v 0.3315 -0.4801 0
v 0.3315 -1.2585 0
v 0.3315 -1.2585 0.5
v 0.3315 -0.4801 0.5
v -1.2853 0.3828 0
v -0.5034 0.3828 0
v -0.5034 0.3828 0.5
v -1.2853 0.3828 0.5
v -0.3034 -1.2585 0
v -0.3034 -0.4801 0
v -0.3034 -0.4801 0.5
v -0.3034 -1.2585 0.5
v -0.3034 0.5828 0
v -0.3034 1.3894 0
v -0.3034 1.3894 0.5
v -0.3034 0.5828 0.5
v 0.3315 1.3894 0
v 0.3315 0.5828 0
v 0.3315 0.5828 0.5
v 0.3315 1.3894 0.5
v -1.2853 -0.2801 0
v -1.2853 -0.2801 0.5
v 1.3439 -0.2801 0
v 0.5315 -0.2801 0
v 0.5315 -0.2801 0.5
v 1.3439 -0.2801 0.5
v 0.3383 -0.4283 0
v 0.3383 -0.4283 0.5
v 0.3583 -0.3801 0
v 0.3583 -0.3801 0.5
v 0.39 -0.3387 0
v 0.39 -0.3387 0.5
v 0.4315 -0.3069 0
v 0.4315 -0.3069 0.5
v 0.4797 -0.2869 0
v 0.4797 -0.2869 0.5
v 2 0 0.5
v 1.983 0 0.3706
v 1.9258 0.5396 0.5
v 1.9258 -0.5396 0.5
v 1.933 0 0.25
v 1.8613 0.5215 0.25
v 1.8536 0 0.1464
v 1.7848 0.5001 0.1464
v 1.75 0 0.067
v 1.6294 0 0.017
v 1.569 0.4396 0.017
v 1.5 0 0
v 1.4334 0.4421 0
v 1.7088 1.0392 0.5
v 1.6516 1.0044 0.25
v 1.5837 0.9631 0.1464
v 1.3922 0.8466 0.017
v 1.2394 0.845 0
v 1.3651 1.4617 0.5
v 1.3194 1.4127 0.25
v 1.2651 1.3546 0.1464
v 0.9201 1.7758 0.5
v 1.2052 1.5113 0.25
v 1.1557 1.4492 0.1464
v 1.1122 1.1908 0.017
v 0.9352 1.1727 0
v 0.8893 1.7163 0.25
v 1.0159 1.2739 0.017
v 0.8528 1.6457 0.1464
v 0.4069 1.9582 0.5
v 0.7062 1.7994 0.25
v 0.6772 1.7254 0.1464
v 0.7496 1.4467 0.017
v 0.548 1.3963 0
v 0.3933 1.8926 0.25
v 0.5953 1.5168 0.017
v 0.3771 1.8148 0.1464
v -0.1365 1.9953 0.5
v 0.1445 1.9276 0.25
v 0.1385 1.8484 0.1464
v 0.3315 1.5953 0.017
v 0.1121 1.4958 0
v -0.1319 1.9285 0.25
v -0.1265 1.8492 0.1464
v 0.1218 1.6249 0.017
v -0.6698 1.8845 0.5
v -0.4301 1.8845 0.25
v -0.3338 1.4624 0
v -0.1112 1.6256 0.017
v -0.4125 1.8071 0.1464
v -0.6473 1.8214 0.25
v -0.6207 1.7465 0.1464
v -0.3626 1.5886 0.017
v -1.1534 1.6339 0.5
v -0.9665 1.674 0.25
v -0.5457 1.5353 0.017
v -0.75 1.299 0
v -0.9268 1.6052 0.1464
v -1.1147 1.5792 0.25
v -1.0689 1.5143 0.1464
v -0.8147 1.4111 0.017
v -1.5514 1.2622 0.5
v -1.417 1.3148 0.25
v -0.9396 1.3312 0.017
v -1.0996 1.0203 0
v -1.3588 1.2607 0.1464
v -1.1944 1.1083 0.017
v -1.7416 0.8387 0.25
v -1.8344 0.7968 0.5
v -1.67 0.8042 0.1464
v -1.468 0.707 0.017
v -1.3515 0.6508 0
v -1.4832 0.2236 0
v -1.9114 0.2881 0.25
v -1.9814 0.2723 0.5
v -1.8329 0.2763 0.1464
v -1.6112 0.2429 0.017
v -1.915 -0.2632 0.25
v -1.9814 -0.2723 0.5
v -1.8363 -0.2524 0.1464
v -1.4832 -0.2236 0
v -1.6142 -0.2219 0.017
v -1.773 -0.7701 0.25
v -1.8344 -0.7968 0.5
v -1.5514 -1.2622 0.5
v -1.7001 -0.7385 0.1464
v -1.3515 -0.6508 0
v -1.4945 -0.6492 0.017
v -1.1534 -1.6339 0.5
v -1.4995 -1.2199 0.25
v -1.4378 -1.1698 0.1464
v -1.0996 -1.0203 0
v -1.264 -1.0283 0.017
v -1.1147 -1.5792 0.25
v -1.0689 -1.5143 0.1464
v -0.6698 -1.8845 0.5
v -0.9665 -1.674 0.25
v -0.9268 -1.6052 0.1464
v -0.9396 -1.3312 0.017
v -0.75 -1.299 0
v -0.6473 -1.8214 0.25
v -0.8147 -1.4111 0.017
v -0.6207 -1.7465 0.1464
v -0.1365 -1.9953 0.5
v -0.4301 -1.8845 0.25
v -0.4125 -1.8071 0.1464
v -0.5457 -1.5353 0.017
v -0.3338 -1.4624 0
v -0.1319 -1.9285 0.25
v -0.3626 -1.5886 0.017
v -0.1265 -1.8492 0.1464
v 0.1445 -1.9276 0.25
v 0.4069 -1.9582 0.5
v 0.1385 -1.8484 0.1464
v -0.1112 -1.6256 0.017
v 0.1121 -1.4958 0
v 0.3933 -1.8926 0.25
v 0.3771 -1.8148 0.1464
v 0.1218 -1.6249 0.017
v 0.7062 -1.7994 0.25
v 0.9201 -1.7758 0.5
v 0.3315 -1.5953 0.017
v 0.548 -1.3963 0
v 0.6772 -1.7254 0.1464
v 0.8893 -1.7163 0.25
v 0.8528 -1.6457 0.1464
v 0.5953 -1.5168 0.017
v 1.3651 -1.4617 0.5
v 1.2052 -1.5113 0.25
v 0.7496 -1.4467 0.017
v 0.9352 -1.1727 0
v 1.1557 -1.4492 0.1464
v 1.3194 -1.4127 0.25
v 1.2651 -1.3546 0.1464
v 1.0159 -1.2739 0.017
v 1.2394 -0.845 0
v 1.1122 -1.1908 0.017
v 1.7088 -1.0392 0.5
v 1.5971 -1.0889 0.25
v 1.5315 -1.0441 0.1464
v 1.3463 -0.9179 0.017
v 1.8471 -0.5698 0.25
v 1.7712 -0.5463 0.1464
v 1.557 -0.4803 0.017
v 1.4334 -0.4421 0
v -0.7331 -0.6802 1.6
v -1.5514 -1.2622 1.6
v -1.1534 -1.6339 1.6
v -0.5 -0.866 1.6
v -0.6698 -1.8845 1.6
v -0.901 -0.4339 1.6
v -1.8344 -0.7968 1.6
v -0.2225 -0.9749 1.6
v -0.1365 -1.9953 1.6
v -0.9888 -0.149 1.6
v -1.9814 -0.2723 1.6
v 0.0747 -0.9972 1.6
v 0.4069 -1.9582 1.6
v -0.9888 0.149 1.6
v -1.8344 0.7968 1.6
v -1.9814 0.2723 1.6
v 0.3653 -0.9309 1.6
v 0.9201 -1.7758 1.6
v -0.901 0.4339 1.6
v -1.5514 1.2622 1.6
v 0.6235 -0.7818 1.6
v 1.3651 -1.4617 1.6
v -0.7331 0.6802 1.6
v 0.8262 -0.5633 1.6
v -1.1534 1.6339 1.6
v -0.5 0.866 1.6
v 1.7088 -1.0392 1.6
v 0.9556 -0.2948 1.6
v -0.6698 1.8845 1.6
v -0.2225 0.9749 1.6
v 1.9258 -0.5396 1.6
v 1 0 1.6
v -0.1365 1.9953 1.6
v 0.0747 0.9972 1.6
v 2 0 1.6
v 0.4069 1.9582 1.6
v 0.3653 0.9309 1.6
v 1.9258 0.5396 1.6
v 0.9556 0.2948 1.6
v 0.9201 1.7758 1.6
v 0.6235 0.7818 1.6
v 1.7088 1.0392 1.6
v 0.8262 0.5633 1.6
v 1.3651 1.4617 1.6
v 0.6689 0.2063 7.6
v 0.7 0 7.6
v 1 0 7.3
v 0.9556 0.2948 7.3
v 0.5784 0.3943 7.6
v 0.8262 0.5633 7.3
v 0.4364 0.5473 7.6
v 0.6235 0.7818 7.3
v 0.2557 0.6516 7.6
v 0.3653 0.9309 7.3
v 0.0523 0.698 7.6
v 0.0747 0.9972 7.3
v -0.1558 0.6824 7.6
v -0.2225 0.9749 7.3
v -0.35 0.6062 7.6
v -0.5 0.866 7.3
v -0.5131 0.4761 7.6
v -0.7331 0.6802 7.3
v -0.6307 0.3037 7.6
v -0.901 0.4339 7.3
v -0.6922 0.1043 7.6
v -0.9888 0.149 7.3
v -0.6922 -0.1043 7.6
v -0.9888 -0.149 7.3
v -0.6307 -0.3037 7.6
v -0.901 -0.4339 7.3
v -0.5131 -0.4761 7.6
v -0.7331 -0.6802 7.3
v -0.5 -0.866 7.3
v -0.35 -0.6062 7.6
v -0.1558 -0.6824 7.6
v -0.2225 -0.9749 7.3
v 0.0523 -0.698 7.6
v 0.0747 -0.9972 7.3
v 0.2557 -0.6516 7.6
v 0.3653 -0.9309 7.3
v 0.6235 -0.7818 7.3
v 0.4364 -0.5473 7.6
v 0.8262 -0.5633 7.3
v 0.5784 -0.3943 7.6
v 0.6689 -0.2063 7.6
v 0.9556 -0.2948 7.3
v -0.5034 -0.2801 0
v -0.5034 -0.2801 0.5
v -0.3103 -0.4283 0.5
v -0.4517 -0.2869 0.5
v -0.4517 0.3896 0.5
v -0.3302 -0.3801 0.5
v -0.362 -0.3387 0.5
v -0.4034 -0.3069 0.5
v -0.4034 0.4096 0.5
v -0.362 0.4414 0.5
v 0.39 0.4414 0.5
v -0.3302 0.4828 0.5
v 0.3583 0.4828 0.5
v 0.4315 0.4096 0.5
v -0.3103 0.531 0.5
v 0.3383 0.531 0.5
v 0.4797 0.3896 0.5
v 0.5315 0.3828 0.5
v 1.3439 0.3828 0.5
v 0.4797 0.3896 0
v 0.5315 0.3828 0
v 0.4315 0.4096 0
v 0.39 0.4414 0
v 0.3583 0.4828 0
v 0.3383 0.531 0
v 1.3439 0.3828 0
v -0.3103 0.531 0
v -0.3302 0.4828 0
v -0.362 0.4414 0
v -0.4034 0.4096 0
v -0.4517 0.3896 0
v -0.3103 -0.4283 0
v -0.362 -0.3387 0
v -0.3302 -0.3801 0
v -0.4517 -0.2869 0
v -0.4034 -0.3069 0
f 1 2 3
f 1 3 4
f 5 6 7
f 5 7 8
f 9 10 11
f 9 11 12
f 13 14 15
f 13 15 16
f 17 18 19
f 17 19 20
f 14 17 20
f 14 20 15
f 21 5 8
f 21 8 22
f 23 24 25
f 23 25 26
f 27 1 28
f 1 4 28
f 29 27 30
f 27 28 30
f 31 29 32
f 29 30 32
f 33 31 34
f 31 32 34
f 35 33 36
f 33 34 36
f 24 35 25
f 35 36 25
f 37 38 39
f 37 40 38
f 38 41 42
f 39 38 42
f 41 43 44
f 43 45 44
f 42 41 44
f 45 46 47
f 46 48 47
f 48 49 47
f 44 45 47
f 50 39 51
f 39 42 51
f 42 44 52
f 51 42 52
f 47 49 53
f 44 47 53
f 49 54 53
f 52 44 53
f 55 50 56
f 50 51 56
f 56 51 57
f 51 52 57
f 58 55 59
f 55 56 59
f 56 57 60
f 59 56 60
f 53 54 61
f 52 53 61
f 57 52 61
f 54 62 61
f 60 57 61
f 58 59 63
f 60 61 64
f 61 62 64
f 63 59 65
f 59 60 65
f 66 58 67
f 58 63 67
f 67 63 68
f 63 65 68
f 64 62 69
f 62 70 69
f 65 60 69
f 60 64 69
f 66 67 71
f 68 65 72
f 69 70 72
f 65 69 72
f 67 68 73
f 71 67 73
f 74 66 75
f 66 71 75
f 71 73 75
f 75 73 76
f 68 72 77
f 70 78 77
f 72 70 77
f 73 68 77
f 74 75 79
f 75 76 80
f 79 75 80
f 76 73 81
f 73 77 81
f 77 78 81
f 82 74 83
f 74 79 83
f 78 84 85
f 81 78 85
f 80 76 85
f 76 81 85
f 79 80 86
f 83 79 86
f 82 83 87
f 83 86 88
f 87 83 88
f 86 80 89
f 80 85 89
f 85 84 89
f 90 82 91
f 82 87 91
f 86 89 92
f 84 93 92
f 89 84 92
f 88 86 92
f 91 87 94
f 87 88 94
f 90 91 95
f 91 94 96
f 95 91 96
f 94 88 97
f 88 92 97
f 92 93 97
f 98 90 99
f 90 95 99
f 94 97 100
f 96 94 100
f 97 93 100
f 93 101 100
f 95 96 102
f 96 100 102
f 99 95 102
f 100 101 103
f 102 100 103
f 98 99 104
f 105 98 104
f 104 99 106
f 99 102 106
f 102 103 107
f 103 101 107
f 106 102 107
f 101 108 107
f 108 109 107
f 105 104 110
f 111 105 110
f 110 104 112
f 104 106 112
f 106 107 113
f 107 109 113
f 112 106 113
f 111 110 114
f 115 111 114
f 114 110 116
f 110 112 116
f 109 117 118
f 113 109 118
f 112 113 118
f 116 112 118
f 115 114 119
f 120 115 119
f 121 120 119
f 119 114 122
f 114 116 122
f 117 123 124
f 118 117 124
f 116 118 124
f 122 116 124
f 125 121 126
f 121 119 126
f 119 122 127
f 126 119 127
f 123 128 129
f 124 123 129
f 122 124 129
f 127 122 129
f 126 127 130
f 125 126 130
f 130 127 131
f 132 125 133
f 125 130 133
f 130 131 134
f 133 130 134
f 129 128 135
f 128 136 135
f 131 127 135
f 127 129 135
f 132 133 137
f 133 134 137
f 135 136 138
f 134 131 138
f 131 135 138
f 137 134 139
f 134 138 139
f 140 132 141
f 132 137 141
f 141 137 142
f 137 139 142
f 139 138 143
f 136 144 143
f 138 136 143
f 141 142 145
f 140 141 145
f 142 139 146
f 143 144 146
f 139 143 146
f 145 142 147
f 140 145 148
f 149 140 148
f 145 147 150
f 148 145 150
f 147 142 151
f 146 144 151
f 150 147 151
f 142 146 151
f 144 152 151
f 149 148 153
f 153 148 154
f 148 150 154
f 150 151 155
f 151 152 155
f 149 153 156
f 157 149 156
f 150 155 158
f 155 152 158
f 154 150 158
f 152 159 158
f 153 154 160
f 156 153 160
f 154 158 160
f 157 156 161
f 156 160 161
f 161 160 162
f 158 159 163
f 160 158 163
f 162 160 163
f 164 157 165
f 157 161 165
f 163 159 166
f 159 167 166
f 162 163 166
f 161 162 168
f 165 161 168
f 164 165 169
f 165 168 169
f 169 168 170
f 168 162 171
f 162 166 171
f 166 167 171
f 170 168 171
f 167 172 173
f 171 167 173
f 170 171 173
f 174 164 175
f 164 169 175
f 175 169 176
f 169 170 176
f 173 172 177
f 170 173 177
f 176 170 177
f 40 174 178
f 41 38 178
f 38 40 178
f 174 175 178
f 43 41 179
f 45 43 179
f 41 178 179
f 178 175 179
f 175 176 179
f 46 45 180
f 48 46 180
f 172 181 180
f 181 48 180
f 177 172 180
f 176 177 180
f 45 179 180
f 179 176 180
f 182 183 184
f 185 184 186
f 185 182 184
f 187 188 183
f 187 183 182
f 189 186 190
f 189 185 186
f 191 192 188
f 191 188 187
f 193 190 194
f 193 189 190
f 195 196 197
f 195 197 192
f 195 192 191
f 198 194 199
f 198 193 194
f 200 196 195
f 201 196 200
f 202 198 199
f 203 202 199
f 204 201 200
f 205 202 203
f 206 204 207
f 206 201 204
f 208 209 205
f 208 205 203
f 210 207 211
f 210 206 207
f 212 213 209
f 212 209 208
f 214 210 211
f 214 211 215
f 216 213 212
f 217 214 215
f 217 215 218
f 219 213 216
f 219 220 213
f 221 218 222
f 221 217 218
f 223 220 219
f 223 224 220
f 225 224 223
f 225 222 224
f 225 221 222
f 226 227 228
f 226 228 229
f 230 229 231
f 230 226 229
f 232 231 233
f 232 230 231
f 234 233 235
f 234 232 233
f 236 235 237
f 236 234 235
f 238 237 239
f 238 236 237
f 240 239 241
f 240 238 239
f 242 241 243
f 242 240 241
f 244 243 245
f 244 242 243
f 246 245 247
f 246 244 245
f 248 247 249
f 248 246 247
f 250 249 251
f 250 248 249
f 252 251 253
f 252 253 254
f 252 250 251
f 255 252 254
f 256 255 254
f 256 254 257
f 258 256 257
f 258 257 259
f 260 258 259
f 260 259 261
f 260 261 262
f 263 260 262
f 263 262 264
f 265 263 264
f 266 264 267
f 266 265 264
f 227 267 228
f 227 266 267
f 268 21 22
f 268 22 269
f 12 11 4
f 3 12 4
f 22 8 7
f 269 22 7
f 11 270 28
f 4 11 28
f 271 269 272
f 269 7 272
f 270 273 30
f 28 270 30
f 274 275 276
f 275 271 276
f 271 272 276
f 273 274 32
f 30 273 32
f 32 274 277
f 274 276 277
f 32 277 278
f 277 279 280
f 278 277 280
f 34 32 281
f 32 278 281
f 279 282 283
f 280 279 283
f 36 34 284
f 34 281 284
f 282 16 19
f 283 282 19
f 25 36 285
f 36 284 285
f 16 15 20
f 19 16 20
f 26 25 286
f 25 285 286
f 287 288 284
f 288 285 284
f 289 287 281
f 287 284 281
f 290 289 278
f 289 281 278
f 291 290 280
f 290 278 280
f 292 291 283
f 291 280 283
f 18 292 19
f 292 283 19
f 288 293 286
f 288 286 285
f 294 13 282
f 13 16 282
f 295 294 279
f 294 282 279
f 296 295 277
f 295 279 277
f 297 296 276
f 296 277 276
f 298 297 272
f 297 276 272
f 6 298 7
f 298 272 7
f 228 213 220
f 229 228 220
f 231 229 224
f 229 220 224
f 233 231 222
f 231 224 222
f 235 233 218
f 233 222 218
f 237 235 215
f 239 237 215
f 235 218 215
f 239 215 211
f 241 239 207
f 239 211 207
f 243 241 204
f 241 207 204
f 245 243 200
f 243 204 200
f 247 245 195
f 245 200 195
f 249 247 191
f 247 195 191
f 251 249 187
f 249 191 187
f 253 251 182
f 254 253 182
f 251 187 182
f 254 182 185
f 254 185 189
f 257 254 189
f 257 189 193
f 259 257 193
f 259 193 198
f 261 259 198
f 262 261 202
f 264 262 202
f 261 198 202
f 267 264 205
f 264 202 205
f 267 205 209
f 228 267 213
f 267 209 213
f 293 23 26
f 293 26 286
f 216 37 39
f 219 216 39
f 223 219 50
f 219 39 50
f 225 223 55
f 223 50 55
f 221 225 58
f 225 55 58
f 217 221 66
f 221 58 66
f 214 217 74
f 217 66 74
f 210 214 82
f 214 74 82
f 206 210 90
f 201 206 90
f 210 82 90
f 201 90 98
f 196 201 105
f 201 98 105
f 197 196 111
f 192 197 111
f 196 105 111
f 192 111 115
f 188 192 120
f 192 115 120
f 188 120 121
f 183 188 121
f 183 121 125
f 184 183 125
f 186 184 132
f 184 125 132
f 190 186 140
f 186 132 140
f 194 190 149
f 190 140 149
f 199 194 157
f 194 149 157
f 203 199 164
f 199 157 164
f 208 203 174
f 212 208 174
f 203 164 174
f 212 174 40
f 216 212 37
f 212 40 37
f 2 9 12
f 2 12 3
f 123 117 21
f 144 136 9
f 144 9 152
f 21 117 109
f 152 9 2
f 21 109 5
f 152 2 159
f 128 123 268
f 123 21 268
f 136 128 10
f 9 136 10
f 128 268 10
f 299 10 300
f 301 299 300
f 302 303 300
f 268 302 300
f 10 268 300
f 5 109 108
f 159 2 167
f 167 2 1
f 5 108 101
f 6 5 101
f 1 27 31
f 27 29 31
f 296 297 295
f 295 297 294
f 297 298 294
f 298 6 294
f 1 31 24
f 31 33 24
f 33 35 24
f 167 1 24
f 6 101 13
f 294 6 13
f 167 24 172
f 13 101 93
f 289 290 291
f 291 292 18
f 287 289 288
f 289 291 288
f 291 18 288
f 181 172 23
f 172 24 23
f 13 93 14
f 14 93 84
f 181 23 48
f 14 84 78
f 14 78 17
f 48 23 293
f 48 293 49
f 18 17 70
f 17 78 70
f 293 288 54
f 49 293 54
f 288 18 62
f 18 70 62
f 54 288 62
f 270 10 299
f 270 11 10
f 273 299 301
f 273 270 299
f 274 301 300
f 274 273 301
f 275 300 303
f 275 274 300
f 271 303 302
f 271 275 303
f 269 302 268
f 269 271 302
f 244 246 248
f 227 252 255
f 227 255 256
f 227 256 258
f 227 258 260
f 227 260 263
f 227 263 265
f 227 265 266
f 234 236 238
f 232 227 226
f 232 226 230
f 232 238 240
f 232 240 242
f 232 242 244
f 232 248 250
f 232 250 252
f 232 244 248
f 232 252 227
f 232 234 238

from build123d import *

# Parameters (mm, degrees)
SKETCH1_R          = 2
EXTRUDE1_DEPTH     = 1.6
SKETCH2_R          = 1
EXTRUDE2_DEPTH     = 6
CUT_EXTRUDE1_DEPTH = 0.5
FILLET1_R          = 0.2
CHAMFER1_SIZE      = 0.3
FILLET2_R          = 0.5


with BuildPart() as part:
    # Sketch1 → Extrude1 (new body)
    with BuildSketch(Plane.XY):
        Circle(SKETCH1_R)
    extrude(amount=EXTRUDE1_DEPTH)

    # Sketch2 → Extrude2 (add)
    with BuildSketch(Plane.XY.offset(1.6)):
        Circle(SKETCH2_R)
    extrude(amount=EXTRUDE2_DEPTH)

    # Sketch3 → Cut-Extrude1 (cut)
    with BuildSketch(Plane(origin=(0, 0, 0), x_dir=(-1, 0, 0), z_dir=(0, 0, -1))):
        Polygon((0.303448276, -0.280106101), (0.303448276, -1.258487543), (-0.331458886, -1.258487543), (-0.331458886, -0.280106101), (-1.343944387, -0.280106101), (-1.343944387, 0.382811671), (-0.331458886, 0.382811671), (-0.331458886, 1.389386448), (0.303448276, 1.389386448), (0.303448276, 0.382811671), (1.285259033, 0.382811671), (1.285259033, -0.280106101), align=None)
    extrude(amount=-CUT_EXTRUDE1_DEPTH, mode=Mode.SUBTRACT)

    # Fillet1
    fillet1_edges = [part.edges().sort_by_distance(p)[0] for p in [
        (0.331458886, 0.382811671, 0.25),
        (-0.303448276, 0.382811671, 0.25),
        (-0.303448276, -0.280106101, 0.25),
        (0.331458886, -0.280106101, 0.25),
    ]]
    fillet(fillet1_edges, radius=FILLET1_R)

    # Chamfer1
    chamfer1_edges = [part.edges().sort_by_distance(p)[0] for p in [
        (-1, 0, 7.6),
    ]]
    chamfer(chamfer1_edges, length=CHAMFER1_SIZE)

    # Fillet2
    fillet2_edges = [part.edges().sort_by_distance(p)[0] for p in [
        (-2, 0, 0),
    ]]
    fillet(fillet2_edges, radius=FILLET2_R)


solid = part.part
